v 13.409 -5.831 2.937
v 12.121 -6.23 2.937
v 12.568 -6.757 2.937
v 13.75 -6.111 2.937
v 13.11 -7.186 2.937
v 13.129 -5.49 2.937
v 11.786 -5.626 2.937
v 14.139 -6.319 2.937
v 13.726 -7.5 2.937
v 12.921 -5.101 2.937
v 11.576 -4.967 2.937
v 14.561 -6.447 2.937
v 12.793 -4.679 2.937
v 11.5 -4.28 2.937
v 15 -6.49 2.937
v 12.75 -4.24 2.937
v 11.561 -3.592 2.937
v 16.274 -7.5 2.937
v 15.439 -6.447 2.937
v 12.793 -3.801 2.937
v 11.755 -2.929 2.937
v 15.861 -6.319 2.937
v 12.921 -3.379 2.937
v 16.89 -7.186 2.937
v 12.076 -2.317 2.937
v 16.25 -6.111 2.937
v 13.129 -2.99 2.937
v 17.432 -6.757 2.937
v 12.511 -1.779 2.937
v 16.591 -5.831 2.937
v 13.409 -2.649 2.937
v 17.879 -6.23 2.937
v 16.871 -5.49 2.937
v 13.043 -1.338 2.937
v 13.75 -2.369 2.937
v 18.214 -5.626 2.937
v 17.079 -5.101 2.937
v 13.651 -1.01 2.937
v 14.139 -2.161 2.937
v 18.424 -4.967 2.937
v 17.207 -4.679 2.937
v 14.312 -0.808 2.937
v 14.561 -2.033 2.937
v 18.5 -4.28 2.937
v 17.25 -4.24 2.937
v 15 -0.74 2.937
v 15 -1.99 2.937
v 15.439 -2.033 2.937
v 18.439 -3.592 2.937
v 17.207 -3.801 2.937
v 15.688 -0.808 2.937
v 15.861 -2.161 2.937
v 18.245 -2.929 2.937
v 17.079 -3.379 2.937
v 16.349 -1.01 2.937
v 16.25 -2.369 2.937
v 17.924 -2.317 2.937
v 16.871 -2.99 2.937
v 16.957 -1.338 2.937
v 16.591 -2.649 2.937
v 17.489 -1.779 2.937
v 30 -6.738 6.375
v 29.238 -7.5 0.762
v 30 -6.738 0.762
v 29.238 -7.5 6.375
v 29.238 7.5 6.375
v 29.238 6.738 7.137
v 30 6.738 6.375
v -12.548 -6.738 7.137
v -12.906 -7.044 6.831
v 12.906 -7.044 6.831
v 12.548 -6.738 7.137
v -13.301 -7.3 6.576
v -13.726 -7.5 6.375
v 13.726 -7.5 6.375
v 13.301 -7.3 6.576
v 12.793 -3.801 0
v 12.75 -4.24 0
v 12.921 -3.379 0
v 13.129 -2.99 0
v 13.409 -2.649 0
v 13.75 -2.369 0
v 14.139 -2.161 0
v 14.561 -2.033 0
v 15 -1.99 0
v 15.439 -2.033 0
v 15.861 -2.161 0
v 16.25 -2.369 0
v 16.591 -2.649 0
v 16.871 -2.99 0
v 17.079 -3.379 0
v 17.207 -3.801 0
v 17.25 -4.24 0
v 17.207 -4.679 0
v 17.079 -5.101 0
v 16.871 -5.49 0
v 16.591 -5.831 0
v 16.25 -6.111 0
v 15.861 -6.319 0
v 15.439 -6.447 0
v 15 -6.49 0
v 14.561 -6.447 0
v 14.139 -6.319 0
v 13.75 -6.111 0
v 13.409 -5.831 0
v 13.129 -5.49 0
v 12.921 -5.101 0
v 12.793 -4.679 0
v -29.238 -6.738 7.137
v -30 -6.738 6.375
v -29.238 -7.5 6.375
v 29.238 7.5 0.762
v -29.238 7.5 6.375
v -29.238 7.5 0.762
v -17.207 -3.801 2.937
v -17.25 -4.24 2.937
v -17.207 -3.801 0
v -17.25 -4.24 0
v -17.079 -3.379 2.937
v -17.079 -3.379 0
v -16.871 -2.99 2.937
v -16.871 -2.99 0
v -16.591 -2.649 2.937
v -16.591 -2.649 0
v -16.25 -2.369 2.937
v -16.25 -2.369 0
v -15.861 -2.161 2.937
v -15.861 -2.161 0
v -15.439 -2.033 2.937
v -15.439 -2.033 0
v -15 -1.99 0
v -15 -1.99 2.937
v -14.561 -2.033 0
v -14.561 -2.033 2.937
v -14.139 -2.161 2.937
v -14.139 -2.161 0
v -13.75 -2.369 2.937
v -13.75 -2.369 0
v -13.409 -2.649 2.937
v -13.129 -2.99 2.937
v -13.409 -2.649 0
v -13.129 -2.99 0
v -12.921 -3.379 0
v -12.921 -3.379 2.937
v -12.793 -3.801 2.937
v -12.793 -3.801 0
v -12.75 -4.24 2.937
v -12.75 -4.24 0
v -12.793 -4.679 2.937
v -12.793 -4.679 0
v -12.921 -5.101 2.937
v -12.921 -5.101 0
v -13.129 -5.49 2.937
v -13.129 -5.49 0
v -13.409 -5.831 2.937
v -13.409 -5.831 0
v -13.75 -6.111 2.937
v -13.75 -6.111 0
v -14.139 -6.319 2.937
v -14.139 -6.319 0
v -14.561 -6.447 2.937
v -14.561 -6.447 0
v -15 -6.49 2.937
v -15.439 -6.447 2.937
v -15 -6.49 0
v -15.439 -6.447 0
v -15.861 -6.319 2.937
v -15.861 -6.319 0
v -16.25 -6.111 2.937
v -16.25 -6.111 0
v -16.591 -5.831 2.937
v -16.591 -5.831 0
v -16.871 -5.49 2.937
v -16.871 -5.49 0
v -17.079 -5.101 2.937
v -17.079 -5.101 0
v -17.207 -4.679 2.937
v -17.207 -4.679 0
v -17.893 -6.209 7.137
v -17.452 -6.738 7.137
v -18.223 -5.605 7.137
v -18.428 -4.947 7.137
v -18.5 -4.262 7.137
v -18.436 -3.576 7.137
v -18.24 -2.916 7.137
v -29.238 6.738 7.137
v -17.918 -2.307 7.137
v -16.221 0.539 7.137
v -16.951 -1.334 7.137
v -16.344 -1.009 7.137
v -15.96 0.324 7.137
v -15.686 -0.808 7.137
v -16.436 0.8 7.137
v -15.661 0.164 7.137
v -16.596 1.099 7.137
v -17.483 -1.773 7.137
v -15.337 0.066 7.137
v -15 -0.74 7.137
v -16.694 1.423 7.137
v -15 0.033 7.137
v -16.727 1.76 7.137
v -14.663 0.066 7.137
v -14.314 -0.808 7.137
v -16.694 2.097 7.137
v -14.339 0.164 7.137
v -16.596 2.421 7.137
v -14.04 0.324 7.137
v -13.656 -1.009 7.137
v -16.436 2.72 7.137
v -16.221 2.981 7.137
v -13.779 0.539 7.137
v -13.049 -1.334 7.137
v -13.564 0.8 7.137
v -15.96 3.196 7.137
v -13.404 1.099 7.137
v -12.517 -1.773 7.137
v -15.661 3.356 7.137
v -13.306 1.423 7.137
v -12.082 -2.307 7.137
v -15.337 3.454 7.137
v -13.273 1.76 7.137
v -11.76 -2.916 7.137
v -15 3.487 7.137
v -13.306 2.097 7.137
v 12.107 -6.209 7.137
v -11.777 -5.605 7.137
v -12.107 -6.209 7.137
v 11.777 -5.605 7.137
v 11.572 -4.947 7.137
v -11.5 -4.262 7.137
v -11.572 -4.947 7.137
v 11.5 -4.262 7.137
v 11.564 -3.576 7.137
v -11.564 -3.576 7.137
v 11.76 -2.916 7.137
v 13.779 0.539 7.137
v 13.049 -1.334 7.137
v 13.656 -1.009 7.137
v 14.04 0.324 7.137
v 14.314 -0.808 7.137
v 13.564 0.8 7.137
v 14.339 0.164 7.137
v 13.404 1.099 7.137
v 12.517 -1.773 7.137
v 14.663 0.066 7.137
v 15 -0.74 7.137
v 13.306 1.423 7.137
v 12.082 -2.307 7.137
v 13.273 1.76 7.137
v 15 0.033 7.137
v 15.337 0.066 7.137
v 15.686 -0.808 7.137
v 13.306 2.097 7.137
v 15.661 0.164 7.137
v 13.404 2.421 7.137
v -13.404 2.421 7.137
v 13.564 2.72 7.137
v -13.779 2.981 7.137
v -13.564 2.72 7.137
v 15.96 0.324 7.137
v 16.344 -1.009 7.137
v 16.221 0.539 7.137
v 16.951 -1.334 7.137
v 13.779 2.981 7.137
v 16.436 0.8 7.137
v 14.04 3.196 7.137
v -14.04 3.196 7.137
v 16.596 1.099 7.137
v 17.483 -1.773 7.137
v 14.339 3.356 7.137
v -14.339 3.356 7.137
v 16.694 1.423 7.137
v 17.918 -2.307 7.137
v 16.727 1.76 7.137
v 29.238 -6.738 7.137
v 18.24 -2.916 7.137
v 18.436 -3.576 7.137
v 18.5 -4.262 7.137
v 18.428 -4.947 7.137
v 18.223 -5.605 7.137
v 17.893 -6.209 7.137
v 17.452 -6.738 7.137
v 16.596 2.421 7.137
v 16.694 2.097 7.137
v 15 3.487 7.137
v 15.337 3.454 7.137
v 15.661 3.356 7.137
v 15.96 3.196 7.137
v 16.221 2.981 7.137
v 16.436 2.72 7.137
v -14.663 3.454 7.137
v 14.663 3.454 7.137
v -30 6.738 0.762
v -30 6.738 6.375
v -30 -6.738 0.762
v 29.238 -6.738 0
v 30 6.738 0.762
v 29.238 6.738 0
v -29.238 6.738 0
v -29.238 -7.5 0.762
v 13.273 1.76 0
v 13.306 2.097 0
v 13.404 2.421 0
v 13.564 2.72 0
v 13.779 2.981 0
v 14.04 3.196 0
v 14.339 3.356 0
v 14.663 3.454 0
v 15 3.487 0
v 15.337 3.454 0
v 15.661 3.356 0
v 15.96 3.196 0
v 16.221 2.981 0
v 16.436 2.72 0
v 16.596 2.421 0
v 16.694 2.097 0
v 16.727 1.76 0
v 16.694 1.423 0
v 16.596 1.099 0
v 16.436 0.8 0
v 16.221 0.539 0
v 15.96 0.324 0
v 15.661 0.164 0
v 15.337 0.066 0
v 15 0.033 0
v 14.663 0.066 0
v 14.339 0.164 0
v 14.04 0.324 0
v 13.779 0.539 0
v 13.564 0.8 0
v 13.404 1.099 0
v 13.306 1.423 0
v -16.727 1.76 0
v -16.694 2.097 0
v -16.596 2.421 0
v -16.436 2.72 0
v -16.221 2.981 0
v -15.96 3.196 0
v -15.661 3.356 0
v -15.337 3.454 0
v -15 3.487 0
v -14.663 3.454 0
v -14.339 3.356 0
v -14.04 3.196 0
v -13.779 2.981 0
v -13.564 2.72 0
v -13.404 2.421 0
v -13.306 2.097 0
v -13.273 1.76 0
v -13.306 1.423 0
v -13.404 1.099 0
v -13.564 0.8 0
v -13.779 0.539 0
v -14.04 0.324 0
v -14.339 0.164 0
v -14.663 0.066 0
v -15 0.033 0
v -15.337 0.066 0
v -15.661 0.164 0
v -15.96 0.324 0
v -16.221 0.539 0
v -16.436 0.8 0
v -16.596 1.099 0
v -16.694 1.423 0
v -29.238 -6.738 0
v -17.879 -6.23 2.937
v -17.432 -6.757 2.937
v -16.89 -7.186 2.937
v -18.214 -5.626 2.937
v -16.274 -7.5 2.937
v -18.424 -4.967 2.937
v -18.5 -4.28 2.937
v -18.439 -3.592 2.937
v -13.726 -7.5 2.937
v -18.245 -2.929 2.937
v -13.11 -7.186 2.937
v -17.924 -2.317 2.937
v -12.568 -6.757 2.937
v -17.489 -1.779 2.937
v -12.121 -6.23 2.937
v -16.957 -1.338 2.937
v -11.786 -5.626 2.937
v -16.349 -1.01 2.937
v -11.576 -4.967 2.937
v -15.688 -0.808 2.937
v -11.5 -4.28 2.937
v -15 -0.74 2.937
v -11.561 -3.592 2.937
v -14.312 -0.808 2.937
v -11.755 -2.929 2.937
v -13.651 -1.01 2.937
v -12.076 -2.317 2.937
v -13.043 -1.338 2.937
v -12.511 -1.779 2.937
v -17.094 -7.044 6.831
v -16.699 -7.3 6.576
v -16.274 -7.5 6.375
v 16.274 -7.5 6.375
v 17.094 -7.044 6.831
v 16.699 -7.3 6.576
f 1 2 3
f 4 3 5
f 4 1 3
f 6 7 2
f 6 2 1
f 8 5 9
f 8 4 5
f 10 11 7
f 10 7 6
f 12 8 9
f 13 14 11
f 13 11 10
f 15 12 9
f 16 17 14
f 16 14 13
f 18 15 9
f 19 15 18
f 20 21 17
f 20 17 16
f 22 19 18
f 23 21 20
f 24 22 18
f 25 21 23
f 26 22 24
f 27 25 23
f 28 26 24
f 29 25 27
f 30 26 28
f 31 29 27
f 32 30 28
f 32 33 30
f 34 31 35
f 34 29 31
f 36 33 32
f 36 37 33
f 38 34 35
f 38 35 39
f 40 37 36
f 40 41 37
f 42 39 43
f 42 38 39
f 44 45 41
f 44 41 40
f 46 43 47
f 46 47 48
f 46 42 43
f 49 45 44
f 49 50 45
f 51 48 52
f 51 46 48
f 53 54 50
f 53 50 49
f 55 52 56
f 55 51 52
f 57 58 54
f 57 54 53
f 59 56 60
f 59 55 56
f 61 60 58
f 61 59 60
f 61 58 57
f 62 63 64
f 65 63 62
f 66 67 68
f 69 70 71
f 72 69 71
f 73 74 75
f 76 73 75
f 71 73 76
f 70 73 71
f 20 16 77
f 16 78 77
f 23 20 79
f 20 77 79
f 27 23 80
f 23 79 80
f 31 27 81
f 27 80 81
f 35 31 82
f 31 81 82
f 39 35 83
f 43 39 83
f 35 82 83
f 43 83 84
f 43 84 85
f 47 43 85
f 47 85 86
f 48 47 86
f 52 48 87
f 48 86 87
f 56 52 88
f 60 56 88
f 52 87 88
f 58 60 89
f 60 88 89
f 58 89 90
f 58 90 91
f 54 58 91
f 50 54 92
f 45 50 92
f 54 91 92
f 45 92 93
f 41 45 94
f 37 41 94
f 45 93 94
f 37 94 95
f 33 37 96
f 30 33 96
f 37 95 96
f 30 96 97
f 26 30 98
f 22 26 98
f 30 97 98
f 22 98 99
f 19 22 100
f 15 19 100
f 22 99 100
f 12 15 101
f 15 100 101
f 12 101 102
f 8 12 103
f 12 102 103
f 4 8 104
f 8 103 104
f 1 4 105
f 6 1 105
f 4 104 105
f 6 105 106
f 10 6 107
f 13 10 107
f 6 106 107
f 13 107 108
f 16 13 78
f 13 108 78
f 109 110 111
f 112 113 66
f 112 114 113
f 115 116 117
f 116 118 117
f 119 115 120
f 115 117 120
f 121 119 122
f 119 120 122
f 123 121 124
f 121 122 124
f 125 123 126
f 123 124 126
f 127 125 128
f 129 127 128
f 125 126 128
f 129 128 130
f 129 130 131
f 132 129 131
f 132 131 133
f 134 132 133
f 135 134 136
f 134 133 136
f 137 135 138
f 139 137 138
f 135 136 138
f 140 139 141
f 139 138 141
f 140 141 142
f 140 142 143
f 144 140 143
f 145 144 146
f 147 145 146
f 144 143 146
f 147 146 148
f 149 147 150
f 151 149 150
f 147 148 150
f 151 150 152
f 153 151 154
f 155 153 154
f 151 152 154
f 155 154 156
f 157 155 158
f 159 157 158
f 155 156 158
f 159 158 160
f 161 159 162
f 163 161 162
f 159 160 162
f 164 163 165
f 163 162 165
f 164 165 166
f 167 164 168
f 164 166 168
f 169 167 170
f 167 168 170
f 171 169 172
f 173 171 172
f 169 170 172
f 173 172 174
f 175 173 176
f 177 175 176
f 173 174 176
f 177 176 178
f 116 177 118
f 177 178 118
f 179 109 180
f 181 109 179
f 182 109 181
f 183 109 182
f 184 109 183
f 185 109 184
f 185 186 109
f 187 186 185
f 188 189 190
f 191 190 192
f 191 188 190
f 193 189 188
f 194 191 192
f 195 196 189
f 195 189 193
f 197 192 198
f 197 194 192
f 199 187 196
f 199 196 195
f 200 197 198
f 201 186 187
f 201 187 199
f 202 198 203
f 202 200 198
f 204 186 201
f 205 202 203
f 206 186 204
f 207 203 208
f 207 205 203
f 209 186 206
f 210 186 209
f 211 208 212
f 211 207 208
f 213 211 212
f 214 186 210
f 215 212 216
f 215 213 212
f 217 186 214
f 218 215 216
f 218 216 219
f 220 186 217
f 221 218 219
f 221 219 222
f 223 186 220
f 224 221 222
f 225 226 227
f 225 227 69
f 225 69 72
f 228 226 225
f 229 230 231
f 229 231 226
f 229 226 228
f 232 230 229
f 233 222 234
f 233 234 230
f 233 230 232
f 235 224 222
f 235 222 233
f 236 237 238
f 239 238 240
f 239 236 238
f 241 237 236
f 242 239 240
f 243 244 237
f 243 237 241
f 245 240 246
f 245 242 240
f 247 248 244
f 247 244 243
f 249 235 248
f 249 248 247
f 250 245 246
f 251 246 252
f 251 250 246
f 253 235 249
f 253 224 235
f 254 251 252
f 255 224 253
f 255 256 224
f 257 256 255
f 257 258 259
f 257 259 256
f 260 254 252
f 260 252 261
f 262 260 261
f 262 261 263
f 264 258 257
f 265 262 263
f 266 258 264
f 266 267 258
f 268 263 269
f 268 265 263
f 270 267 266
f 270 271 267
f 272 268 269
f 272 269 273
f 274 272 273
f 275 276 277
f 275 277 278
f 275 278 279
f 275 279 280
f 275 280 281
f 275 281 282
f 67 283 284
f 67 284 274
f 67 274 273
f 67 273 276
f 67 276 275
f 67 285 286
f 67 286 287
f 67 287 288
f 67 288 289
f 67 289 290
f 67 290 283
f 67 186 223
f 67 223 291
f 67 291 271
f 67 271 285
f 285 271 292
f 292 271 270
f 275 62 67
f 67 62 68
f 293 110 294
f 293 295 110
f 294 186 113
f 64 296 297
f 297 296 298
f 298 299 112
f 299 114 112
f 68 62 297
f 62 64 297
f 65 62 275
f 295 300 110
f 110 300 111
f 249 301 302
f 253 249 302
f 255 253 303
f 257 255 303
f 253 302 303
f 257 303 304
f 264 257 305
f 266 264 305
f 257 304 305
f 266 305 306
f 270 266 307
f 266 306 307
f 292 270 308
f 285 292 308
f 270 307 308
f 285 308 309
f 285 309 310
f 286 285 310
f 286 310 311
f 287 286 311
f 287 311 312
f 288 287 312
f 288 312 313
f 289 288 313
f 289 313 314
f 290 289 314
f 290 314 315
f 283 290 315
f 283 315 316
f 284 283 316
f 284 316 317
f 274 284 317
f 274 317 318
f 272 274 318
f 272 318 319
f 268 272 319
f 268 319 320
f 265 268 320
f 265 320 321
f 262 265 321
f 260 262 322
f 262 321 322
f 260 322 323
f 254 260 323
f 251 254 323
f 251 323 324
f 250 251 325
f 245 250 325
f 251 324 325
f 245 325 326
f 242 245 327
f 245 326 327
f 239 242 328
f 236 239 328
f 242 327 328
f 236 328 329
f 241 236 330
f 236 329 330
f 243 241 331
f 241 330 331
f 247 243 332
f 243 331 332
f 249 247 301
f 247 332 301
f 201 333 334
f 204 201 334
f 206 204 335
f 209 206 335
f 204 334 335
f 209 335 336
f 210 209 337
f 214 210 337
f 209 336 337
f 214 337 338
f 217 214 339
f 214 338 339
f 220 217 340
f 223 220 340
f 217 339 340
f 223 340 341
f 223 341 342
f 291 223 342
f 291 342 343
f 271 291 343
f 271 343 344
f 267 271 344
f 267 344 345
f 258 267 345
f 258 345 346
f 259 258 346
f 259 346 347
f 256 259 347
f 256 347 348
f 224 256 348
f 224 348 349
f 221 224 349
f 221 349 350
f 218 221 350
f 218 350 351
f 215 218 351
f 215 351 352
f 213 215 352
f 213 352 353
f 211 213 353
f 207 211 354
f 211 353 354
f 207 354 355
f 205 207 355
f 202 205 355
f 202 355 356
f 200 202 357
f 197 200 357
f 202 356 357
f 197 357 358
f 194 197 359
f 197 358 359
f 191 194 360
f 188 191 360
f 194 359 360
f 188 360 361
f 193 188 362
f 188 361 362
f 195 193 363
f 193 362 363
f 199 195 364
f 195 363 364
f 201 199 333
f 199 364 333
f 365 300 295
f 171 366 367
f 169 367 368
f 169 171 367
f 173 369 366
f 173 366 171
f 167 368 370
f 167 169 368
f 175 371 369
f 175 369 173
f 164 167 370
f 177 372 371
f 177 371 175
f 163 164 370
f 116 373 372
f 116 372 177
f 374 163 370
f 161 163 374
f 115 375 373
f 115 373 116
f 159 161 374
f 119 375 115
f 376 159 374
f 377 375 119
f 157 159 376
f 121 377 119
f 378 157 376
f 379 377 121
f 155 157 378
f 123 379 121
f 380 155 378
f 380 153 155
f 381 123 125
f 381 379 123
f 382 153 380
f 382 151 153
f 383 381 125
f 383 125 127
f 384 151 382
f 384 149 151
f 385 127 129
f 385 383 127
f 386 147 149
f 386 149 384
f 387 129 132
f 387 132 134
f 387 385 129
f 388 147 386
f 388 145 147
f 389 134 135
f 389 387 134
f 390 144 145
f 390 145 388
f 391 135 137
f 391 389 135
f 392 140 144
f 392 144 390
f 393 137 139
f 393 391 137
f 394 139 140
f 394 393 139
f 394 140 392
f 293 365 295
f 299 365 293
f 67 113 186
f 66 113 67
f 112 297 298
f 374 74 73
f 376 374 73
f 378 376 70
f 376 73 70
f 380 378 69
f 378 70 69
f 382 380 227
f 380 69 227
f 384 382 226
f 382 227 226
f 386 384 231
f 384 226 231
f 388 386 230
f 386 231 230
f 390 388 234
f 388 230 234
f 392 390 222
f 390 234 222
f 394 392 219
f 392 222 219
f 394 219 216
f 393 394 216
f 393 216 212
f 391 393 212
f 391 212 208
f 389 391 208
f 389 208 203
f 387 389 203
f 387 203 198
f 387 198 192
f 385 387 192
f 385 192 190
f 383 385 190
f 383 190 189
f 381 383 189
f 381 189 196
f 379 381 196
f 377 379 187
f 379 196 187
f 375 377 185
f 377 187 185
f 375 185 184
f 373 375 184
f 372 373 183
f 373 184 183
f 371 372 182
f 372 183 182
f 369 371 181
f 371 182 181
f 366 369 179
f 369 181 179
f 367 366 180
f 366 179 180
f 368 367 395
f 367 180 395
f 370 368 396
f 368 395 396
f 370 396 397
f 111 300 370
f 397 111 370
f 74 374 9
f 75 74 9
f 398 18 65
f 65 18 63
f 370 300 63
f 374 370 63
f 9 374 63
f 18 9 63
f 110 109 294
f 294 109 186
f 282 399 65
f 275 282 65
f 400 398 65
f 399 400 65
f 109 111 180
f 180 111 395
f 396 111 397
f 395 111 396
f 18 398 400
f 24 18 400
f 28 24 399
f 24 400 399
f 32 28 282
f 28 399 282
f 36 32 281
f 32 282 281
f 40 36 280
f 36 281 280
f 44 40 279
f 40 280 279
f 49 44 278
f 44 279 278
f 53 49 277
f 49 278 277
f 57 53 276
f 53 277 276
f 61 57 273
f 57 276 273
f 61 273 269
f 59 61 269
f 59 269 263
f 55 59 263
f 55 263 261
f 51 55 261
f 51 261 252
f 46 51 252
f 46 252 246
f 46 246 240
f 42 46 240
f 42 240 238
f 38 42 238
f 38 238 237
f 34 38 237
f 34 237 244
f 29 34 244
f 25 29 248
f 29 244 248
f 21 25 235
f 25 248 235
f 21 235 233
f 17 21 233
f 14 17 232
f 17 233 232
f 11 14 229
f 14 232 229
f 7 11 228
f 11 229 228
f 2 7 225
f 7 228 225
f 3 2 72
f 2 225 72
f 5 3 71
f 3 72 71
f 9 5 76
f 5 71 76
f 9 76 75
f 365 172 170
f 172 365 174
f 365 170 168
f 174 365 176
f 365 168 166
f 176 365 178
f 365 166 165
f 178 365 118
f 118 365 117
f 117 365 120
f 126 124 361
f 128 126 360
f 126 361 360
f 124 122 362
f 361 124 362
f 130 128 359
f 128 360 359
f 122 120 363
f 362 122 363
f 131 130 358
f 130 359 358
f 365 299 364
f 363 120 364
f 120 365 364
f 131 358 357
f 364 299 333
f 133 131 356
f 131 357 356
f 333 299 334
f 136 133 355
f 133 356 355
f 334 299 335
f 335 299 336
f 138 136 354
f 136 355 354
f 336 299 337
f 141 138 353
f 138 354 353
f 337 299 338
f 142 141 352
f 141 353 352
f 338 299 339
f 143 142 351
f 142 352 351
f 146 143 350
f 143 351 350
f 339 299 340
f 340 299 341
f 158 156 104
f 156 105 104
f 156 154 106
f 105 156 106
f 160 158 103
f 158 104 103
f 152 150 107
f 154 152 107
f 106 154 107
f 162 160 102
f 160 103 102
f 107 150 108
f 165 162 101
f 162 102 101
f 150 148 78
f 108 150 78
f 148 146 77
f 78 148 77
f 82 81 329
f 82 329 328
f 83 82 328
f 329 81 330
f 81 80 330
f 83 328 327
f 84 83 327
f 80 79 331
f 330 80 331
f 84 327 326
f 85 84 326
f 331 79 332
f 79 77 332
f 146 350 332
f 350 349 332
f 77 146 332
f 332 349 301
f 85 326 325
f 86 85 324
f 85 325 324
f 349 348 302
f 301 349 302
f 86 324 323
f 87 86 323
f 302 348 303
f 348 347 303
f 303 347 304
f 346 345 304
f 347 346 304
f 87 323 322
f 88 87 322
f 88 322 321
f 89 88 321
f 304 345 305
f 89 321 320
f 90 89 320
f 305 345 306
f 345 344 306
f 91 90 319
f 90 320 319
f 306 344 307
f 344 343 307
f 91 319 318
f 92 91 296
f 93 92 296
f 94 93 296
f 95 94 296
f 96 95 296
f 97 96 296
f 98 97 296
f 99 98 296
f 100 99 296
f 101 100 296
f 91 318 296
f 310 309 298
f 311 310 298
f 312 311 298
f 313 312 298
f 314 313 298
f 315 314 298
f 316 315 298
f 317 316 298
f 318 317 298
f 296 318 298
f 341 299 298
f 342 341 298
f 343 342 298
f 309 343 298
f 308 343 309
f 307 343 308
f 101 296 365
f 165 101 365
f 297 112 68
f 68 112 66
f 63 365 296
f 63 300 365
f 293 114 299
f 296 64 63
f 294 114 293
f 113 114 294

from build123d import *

# Parameters (mm, degrees)
F0_W           = 60
F0_H           = 15
F1_DEPTH       = 7.1374
F3_D           = 3.4544
F4_D           = 4.5
F4_CBORE_D     = 7
F4_CBORE_DEPTH = 4.2
F5_SIZE        = 0.762


with BuildPart() as f1:
    # F0 (on Top) → F1 (new body)
    with BuildSketch(Plane.XY):
        Rectangle(F0_W, F0_H)
    extrude(amount=F1_DEPTH)

    # F3 (through all)
    with Locations(Plane.XY.offset(7.1374)):
        with Locations((-15, 1.76), (15, 1.76)):
            Hole(F3_D / 2)

    # F4 (through all)
    with Locations(Plane.XY.offset(7.1374)):
        with Locations((-15, -4.24), (15, -4.24)):
            CounterBoreHole(F4_D / 2, F4_CBORE_D / 2, F4_CBORE_DEPTH)

    # F5
    f5_edges = [f1.edges().sort_by_distance(p)[0] for p in [
        (0, -7.5, 7.1374),
        (-30, 0, 7.1374),
        (0, 7.5, 7.1374),
        (30, 0, 7.1374),
        (30, -7.5, 3.5687),
        (30, 7.5, 3.5687),
        (30, 0, 0),
        (0, 7.5, 0),
        (-30, 7.5, 3.5687),
        (0, -7.5, 0),
        (-30, -7.5, 3.5687),
        (-30, 0, 0),
        (23.136867, -7.5, 7.1374),
        (-23.136867, -7.5, 7.1374),
    ]]
    chamfer(f5_edges, length=F5_SIZE)


solid = f1.part
